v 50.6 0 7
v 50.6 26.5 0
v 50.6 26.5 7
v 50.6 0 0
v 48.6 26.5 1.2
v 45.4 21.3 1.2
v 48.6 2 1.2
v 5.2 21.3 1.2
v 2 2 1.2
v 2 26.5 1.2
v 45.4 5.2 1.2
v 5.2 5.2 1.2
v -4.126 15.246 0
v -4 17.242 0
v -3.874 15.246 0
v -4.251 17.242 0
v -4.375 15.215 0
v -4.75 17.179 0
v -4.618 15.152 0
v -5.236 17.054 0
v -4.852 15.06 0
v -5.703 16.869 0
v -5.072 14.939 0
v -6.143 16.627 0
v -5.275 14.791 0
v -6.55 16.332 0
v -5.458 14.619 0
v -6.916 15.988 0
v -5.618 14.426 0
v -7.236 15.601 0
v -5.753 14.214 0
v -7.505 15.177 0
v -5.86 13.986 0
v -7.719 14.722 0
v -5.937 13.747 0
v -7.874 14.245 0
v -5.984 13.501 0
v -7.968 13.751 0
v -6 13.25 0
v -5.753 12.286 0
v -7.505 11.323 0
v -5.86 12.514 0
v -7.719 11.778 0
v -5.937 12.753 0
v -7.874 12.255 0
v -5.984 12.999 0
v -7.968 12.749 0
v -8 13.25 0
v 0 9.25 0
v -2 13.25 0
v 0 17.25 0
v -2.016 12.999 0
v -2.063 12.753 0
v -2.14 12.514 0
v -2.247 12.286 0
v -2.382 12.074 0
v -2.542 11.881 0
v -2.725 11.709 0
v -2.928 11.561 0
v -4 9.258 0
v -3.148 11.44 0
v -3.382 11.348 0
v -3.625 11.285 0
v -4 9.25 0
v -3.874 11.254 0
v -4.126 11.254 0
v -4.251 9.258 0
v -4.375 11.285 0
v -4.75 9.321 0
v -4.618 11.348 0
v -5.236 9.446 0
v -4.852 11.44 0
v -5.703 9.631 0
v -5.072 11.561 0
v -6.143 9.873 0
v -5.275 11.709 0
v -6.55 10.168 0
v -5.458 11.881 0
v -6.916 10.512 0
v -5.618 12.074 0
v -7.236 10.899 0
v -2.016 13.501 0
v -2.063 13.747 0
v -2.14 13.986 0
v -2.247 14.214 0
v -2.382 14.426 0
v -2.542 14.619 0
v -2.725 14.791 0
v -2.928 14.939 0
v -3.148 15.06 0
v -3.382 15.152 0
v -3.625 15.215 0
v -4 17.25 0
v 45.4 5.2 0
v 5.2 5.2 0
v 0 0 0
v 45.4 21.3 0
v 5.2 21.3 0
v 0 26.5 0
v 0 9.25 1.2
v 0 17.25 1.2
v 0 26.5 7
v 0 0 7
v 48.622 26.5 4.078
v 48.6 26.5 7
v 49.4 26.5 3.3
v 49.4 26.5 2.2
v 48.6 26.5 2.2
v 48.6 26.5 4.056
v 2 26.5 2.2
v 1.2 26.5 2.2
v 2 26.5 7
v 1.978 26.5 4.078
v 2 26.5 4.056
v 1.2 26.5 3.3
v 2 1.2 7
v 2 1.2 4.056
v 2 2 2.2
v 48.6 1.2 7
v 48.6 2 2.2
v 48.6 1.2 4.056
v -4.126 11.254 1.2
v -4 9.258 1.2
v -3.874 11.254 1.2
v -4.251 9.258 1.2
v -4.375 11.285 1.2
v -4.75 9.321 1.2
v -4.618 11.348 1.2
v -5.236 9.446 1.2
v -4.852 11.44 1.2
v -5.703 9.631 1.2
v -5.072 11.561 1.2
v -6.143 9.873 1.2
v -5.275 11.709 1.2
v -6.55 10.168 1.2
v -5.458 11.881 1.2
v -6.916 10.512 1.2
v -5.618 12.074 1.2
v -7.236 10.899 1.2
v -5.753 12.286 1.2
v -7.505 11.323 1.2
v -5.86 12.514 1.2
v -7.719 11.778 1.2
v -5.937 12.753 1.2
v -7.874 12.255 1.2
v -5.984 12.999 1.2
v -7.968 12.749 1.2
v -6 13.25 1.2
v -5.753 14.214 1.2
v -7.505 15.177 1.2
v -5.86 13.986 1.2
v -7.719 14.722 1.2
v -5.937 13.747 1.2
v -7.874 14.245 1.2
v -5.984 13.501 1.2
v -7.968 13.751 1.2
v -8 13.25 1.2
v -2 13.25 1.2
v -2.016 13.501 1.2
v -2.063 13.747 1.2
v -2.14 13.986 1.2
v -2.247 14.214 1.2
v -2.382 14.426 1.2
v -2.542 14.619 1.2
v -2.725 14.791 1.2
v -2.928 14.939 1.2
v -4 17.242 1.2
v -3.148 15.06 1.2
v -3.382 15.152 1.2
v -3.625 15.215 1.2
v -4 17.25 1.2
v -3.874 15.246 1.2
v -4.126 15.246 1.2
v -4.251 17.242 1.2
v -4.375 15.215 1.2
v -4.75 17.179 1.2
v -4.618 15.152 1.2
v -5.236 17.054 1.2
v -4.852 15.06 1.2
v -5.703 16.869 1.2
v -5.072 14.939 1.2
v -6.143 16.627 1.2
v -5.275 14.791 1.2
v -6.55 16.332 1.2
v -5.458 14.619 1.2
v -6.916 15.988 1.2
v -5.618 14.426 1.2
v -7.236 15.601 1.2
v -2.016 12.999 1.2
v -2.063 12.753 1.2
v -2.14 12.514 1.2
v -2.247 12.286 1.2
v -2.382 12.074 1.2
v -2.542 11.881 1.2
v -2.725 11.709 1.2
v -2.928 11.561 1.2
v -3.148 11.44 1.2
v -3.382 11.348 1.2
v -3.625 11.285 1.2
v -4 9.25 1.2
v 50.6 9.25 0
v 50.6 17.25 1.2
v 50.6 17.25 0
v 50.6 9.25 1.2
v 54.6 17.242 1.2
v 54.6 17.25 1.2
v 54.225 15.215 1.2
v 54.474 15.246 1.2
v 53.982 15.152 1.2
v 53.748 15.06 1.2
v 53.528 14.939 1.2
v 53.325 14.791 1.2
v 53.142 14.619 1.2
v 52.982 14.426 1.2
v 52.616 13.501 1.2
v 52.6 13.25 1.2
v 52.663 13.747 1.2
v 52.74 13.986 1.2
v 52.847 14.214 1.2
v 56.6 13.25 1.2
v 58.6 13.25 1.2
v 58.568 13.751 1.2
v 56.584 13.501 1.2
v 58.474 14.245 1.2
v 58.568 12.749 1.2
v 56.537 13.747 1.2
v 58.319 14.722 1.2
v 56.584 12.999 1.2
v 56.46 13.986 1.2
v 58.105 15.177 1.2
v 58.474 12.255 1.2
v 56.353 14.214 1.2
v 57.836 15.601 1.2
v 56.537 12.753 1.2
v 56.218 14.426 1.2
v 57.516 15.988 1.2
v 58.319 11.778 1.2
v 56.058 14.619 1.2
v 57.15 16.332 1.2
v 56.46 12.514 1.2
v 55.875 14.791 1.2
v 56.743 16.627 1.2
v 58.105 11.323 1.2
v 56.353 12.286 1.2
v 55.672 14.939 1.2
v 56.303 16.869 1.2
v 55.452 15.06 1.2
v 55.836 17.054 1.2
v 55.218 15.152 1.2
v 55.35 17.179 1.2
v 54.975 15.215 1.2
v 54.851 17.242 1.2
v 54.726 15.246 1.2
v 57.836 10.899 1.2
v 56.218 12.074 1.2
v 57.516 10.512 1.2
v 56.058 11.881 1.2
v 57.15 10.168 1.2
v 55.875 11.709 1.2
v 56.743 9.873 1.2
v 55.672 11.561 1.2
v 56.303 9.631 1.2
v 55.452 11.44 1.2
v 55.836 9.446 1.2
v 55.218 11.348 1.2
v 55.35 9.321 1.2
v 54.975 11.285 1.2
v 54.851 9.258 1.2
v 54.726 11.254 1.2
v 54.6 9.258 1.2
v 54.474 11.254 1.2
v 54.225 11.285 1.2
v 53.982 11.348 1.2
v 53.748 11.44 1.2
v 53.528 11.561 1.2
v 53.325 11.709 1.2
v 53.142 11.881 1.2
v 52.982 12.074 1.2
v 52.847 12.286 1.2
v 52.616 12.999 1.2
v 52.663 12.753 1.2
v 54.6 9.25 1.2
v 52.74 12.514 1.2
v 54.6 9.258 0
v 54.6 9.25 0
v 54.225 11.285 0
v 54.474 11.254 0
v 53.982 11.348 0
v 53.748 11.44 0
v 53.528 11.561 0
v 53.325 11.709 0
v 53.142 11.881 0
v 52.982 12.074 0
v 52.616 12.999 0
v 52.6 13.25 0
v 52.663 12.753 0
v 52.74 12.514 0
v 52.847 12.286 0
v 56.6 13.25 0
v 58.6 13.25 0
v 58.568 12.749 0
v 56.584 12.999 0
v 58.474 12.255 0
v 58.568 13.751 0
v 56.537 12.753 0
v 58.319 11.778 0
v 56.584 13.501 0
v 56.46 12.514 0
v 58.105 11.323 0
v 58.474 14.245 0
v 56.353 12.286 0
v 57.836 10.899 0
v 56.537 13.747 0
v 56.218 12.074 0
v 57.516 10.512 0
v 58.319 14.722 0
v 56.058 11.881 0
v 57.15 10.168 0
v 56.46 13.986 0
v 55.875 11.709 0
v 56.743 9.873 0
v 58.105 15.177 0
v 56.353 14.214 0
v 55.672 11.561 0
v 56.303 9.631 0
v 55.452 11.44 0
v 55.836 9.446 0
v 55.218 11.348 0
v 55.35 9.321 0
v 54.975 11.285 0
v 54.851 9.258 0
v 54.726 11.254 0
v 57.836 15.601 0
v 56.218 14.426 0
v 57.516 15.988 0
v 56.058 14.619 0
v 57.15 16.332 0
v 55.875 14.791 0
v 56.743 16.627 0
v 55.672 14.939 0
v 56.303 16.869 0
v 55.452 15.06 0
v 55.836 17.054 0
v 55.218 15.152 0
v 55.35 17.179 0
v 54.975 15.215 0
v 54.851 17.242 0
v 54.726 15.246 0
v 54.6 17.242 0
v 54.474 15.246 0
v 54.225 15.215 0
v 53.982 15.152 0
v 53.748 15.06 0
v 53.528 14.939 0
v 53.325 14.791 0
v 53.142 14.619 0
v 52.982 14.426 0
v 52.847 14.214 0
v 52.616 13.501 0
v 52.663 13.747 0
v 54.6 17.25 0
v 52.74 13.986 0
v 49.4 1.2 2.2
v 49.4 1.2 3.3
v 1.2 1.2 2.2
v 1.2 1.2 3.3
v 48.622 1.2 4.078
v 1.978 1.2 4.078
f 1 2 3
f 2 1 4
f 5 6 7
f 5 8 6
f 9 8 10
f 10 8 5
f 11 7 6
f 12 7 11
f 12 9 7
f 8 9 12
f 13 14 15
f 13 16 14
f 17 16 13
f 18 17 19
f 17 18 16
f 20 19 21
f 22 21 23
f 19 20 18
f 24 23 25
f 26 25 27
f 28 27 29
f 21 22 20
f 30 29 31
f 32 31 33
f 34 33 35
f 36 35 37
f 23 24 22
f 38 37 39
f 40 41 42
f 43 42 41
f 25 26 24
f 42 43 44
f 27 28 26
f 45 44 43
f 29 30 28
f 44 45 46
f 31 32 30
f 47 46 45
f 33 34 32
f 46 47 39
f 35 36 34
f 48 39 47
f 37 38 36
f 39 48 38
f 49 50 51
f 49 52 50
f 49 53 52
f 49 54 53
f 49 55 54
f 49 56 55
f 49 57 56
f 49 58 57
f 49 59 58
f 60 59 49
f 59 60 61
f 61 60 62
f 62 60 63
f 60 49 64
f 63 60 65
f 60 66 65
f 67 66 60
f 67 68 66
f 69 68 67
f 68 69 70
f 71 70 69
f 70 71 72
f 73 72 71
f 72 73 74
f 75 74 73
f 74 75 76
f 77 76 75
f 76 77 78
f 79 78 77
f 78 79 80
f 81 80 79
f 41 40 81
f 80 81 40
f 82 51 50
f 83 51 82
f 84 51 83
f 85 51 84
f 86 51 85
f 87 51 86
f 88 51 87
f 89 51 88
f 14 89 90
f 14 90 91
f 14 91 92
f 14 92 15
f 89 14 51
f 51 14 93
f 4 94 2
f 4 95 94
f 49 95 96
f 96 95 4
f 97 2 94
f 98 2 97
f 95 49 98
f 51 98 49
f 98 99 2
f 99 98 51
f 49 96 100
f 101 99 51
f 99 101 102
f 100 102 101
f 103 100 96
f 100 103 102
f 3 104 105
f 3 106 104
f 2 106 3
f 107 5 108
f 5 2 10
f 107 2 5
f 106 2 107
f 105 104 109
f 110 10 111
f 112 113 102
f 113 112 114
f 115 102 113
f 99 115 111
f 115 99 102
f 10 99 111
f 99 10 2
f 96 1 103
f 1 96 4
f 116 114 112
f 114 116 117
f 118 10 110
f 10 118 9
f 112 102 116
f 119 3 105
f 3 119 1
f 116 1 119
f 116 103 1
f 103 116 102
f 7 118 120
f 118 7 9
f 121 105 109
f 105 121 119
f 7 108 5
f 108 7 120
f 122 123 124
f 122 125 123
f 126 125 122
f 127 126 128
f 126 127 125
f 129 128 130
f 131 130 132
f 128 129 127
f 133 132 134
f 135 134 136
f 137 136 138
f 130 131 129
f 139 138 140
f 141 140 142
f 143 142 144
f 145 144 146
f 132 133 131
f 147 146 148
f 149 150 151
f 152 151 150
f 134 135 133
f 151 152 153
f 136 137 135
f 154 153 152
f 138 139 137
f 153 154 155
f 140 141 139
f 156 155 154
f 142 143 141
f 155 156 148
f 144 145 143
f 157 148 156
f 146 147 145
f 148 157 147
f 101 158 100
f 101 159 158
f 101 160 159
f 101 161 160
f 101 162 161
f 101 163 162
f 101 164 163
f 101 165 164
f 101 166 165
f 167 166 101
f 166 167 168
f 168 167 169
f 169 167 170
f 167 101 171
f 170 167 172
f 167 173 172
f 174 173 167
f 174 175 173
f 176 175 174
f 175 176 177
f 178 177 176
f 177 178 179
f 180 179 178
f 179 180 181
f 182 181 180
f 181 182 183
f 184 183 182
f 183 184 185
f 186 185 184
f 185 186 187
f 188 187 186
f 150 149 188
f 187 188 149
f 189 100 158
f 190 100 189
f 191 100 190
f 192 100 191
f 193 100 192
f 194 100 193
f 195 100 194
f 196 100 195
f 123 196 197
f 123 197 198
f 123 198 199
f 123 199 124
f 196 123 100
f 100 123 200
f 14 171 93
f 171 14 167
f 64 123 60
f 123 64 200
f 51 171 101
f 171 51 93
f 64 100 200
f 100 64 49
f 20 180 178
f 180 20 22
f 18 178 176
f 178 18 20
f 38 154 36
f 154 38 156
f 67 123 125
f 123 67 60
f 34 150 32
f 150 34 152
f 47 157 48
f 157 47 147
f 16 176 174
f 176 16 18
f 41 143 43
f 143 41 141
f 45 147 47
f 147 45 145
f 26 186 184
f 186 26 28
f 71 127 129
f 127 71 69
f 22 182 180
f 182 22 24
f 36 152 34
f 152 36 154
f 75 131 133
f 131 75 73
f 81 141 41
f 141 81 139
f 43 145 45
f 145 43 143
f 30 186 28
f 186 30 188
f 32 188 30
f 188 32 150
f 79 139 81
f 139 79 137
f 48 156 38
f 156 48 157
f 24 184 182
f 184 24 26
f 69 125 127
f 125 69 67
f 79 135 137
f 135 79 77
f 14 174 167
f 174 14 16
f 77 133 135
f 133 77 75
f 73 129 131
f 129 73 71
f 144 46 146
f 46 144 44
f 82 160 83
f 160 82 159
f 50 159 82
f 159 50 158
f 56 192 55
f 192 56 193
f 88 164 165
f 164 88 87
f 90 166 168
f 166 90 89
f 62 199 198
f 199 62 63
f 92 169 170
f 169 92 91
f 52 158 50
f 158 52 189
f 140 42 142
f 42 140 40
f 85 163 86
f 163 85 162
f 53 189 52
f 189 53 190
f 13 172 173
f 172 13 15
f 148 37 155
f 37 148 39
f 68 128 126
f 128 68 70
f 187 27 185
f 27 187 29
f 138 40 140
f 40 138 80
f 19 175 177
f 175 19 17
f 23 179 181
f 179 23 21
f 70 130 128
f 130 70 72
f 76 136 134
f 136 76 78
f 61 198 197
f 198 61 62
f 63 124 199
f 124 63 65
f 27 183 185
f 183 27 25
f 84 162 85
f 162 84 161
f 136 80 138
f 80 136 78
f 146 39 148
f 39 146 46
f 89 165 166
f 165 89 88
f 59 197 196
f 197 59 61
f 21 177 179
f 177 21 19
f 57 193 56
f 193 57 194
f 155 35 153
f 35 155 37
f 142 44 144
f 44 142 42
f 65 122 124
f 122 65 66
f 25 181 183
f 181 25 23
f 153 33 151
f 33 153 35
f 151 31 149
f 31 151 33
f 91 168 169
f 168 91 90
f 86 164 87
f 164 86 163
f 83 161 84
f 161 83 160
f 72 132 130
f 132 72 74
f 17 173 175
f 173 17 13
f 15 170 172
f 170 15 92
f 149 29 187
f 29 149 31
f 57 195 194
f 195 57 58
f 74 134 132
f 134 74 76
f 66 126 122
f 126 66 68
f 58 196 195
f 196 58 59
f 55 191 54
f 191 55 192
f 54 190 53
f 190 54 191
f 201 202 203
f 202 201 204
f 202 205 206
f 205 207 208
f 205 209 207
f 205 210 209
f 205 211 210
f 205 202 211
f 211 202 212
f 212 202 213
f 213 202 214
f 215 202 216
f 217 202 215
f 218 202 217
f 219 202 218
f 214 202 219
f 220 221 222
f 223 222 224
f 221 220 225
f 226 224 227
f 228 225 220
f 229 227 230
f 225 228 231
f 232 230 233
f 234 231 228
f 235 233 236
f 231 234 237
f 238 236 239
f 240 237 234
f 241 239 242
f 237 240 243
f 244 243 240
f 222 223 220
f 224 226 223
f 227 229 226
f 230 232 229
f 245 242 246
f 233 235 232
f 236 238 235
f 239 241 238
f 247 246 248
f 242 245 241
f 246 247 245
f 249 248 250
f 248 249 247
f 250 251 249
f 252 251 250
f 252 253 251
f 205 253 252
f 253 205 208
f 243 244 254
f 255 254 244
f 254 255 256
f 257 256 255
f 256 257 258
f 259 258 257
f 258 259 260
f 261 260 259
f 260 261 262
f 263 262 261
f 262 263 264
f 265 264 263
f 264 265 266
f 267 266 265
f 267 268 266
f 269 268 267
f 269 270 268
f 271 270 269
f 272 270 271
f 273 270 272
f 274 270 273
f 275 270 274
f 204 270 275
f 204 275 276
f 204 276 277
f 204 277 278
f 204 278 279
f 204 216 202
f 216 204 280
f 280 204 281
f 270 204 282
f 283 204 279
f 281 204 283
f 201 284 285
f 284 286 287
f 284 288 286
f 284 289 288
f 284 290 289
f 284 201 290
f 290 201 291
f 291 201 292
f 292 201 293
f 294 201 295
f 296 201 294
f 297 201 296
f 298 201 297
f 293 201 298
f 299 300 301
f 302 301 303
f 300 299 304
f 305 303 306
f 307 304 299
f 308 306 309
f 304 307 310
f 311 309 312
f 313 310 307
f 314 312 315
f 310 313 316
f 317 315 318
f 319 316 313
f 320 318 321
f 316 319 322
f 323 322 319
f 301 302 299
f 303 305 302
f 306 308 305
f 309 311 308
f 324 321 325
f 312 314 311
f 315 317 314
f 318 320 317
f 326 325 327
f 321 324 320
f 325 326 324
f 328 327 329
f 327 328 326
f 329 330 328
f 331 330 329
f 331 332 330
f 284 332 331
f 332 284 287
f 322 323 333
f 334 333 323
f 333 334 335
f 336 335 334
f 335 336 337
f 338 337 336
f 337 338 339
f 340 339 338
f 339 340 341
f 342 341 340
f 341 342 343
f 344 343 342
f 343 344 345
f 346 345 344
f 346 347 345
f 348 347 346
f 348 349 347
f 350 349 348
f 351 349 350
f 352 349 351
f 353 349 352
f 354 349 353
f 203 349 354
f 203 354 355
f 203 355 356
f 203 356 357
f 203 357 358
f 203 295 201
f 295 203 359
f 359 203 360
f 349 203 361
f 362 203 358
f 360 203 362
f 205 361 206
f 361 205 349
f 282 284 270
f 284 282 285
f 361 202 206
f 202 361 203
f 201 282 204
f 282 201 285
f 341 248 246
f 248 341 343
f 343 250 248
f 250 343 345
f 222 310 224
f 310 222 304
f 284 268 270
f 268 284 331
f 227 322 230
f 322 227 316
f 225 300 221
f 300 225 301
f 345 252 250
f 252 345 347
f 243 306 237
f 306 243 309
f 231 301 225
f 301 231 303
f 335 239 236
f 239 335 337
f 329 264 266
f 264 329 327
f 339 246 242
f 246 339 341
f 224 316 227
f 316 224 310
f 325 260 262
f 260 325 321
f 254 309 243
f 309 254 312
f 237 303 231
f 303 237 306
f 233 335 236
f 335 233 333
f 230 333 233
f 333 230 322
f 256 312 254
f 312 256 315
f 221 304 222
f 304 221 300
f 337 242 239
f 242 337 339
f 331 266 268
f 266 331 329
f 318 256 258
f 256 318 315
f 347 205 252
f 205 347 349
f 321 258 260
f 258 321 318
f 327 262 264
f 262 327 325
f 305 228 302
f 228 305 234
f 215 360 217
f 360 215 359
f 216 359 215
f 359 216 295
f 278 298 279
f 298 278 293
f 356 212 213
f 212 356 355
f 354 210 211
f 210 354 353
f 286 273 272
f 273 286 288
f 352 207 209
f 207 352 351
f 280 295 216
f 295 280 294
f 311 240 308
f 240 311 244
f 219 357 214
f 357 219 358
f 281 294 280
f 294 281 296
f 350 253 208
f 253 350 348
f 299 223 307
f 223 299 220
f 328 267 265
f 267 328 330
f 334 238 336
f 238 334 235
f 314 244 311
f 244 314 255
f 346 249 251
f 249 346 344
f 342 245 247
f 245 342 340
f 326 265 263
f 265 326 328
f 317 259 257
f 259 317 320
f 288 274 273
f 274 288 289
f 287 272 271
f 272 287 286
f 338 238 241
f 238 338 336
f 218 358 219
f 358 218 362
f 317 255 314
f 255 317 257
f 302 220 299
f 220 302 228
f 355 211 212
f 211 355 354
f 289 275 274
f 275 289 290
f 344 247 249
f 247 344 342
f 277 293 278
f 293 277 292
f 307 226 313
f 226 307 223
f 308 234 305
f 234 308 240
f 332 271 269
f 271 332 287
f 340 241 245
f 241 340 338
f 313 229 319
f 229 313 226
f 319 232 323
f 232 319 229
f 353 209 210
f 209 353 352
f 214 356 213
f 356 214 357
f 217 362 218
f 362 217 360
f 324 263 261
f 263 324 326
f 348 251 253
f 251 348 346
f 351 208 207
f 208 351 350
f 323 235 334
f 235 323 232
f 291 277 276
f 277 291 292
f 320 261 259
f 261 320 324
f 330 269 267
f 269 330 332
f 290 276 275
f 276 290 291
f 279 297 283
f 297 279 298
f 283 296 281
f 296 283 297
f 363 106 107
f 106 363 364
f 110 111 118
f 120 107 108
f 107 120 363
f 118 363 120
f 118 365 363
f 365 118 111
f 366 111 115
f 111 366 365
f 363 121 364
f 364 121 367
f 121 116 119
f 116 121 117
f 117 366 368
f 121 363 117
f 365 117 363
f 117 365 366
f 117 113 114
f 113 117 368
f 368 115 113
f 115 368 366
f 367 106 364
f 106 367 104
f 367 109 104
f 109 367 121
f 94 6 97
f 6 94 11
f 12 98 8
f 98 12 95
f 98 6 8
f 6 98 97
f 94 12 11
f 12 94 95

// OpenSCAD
// for led power module modified

/* bluetooth_mate_holder.scad
 * By John Biehler - November 17, 2011
 * http://www.thingiverse.com/thing:

 * derived from pcb_box_slide_with_tabs.scad
 * By Nicholas C Lewis - Jan 1, 2011
 * http://www.thingiverse.com/thing:5396
 *
 * derived from pcb_box_slide.scad
 *     Parametric, open PCB-box (slide-in) by chlunde
 *     http://www.thingiverse.com/thing:4071
 *
 * CHANGES
 * - adjusted to fit Arduino Mega
 * - added mounting tabs
 * - turned off cutouts
 * - adjusted bottom cutout size
 */

$fn=50;

//Uno is 2.7" x 2.1" which is 68.58 mm x 53.34 mm
//Round up to 69 mm x 54 mm
pcb_width = 48.2;
pcb_length =24.1;
pcb_height =1.1;
slisse = 0.8;

pcb_bottom_margin = 1;
wall_width_thick = 2;
wall_width = wall_width_thick-slisse;
box_height = 7;

//tab parameters
tab_hole_radius=2;
tab_outer_radius=4;

inner_margin = 4;

add_tabs = true;

module pcb_led_cvf() {
	difference() {
		box();
		pcb();
		holes();
	}
}

module tab() {
	difference(){
		union() {
			translate([-tab_outer_radius,-tab_outer_radius,0])
			cube([tab_outer_radius,2*tab_outer_radius,wall_width]);
			translate([-tab_outer_radius,0,0])
				cylinder(r=tab_outer_radius, h = wall_width);
		}
		translate([-tab_outer_radius,0,0])
		 cylinder(r= tab_hole_radius, h = wall_width+3,center=true);
	}

}

module box() {
	union() {
		cube([pcb_width + 2*wall_width, pcb_length + 2*wall_width, wall_width]);

		cube([wall_width_thick, pcb_length + 2*wall_width, box_height]);

		cube([pcb_width + 2*wall_width, wall_width_thick, box_height]);

		%translate([0, pcb_length+wall_width, 0])
			cube([pcb_width + 2*wall_width,wall_width,box_height]);

		translate([pcb_width + wall_width - slisse,0,0])
			cube([wall_width_thick, pcb_length + 2*wall_width, box_height]);
	}
	if(add_tabs) {
//comment out this part to remove tabs
		for(i=[(pcb_length + 2*wall_width)/2]){
	translate([0,i,0])tab();
	translate([pcb_width + 2*wall_width,i,0])mirror()tab();
		}
	}

}

module pcb() {
	translate([wall_width, wall_width, wall_width + pcb_bottom_margin])
		cube([pcb_width,pcb_length + wall_width + 0.1,pcb_height]);
	translate([wall_width, wall_width, wall_width + pcb_bottom_margin+pcb_height])rotate([0,45,0])
		cube([pcb_height,pcb_length + wall_width + 0.1,pcb_height]);
	translate([wall_width+pcb_width-2*cos(45)*pcb_height, wall_width, wall_width + pcb_bottom_margin+pcb_height])rotate([0,45,0])
		cube([pcb_height,pcb_length + wall_width + 0.1,pcb_height]);
	translate([wall_width_thick, wall_width, wall_width + pcb_bottom_margin])
		cube([pcb_width-2*slisse,pcb_length + wall_width + 0.1,box_height]);

}



module holes() {
		*translate([wall_width + pcb_width/2, wall_width_thick + 0.1, pcb_width/2+wall_width])
			rotate(a=90,v=[1,0,0])
				cylinder(r=pcb_width/2, h=wall_width_thick + 0.2);

		*translate([-0.1, wall_width + pcb_length/2, pcb_length/2 + wall_width])
			rotate(a=90,v=[0,1,0])
				cylinder(r=pcb_length/2, h=wall_width_thick + 0.2);

		*translate([pcb_width + wall_width - slisse - 0.1, wall_width + pcb_length/2, pcb_length/2 + wall_width])
			rotate(a=90,v=[0,1,0])
				cylinder(r=pcb_length/2, h=wall_width_thick + 0.2);

	 * translate([pcb_width/2 + wall_width, wall_width + pcb_length/2, -0.1])
			rotate(a=0,v=[0,1,0])
				cylinder(r=min(pcb_length,pcb_width)/2 - wall_width/2, h=wall_width_thick + 0.2);

		translate([inner_margin +wall_width, inner_margin+wall_width, -0.1])
			cube([pcb_width-inner_margin*2,pcb_length -inner_margin*2,wall_width + 0.2]);
}


pcb_led_cvf();
